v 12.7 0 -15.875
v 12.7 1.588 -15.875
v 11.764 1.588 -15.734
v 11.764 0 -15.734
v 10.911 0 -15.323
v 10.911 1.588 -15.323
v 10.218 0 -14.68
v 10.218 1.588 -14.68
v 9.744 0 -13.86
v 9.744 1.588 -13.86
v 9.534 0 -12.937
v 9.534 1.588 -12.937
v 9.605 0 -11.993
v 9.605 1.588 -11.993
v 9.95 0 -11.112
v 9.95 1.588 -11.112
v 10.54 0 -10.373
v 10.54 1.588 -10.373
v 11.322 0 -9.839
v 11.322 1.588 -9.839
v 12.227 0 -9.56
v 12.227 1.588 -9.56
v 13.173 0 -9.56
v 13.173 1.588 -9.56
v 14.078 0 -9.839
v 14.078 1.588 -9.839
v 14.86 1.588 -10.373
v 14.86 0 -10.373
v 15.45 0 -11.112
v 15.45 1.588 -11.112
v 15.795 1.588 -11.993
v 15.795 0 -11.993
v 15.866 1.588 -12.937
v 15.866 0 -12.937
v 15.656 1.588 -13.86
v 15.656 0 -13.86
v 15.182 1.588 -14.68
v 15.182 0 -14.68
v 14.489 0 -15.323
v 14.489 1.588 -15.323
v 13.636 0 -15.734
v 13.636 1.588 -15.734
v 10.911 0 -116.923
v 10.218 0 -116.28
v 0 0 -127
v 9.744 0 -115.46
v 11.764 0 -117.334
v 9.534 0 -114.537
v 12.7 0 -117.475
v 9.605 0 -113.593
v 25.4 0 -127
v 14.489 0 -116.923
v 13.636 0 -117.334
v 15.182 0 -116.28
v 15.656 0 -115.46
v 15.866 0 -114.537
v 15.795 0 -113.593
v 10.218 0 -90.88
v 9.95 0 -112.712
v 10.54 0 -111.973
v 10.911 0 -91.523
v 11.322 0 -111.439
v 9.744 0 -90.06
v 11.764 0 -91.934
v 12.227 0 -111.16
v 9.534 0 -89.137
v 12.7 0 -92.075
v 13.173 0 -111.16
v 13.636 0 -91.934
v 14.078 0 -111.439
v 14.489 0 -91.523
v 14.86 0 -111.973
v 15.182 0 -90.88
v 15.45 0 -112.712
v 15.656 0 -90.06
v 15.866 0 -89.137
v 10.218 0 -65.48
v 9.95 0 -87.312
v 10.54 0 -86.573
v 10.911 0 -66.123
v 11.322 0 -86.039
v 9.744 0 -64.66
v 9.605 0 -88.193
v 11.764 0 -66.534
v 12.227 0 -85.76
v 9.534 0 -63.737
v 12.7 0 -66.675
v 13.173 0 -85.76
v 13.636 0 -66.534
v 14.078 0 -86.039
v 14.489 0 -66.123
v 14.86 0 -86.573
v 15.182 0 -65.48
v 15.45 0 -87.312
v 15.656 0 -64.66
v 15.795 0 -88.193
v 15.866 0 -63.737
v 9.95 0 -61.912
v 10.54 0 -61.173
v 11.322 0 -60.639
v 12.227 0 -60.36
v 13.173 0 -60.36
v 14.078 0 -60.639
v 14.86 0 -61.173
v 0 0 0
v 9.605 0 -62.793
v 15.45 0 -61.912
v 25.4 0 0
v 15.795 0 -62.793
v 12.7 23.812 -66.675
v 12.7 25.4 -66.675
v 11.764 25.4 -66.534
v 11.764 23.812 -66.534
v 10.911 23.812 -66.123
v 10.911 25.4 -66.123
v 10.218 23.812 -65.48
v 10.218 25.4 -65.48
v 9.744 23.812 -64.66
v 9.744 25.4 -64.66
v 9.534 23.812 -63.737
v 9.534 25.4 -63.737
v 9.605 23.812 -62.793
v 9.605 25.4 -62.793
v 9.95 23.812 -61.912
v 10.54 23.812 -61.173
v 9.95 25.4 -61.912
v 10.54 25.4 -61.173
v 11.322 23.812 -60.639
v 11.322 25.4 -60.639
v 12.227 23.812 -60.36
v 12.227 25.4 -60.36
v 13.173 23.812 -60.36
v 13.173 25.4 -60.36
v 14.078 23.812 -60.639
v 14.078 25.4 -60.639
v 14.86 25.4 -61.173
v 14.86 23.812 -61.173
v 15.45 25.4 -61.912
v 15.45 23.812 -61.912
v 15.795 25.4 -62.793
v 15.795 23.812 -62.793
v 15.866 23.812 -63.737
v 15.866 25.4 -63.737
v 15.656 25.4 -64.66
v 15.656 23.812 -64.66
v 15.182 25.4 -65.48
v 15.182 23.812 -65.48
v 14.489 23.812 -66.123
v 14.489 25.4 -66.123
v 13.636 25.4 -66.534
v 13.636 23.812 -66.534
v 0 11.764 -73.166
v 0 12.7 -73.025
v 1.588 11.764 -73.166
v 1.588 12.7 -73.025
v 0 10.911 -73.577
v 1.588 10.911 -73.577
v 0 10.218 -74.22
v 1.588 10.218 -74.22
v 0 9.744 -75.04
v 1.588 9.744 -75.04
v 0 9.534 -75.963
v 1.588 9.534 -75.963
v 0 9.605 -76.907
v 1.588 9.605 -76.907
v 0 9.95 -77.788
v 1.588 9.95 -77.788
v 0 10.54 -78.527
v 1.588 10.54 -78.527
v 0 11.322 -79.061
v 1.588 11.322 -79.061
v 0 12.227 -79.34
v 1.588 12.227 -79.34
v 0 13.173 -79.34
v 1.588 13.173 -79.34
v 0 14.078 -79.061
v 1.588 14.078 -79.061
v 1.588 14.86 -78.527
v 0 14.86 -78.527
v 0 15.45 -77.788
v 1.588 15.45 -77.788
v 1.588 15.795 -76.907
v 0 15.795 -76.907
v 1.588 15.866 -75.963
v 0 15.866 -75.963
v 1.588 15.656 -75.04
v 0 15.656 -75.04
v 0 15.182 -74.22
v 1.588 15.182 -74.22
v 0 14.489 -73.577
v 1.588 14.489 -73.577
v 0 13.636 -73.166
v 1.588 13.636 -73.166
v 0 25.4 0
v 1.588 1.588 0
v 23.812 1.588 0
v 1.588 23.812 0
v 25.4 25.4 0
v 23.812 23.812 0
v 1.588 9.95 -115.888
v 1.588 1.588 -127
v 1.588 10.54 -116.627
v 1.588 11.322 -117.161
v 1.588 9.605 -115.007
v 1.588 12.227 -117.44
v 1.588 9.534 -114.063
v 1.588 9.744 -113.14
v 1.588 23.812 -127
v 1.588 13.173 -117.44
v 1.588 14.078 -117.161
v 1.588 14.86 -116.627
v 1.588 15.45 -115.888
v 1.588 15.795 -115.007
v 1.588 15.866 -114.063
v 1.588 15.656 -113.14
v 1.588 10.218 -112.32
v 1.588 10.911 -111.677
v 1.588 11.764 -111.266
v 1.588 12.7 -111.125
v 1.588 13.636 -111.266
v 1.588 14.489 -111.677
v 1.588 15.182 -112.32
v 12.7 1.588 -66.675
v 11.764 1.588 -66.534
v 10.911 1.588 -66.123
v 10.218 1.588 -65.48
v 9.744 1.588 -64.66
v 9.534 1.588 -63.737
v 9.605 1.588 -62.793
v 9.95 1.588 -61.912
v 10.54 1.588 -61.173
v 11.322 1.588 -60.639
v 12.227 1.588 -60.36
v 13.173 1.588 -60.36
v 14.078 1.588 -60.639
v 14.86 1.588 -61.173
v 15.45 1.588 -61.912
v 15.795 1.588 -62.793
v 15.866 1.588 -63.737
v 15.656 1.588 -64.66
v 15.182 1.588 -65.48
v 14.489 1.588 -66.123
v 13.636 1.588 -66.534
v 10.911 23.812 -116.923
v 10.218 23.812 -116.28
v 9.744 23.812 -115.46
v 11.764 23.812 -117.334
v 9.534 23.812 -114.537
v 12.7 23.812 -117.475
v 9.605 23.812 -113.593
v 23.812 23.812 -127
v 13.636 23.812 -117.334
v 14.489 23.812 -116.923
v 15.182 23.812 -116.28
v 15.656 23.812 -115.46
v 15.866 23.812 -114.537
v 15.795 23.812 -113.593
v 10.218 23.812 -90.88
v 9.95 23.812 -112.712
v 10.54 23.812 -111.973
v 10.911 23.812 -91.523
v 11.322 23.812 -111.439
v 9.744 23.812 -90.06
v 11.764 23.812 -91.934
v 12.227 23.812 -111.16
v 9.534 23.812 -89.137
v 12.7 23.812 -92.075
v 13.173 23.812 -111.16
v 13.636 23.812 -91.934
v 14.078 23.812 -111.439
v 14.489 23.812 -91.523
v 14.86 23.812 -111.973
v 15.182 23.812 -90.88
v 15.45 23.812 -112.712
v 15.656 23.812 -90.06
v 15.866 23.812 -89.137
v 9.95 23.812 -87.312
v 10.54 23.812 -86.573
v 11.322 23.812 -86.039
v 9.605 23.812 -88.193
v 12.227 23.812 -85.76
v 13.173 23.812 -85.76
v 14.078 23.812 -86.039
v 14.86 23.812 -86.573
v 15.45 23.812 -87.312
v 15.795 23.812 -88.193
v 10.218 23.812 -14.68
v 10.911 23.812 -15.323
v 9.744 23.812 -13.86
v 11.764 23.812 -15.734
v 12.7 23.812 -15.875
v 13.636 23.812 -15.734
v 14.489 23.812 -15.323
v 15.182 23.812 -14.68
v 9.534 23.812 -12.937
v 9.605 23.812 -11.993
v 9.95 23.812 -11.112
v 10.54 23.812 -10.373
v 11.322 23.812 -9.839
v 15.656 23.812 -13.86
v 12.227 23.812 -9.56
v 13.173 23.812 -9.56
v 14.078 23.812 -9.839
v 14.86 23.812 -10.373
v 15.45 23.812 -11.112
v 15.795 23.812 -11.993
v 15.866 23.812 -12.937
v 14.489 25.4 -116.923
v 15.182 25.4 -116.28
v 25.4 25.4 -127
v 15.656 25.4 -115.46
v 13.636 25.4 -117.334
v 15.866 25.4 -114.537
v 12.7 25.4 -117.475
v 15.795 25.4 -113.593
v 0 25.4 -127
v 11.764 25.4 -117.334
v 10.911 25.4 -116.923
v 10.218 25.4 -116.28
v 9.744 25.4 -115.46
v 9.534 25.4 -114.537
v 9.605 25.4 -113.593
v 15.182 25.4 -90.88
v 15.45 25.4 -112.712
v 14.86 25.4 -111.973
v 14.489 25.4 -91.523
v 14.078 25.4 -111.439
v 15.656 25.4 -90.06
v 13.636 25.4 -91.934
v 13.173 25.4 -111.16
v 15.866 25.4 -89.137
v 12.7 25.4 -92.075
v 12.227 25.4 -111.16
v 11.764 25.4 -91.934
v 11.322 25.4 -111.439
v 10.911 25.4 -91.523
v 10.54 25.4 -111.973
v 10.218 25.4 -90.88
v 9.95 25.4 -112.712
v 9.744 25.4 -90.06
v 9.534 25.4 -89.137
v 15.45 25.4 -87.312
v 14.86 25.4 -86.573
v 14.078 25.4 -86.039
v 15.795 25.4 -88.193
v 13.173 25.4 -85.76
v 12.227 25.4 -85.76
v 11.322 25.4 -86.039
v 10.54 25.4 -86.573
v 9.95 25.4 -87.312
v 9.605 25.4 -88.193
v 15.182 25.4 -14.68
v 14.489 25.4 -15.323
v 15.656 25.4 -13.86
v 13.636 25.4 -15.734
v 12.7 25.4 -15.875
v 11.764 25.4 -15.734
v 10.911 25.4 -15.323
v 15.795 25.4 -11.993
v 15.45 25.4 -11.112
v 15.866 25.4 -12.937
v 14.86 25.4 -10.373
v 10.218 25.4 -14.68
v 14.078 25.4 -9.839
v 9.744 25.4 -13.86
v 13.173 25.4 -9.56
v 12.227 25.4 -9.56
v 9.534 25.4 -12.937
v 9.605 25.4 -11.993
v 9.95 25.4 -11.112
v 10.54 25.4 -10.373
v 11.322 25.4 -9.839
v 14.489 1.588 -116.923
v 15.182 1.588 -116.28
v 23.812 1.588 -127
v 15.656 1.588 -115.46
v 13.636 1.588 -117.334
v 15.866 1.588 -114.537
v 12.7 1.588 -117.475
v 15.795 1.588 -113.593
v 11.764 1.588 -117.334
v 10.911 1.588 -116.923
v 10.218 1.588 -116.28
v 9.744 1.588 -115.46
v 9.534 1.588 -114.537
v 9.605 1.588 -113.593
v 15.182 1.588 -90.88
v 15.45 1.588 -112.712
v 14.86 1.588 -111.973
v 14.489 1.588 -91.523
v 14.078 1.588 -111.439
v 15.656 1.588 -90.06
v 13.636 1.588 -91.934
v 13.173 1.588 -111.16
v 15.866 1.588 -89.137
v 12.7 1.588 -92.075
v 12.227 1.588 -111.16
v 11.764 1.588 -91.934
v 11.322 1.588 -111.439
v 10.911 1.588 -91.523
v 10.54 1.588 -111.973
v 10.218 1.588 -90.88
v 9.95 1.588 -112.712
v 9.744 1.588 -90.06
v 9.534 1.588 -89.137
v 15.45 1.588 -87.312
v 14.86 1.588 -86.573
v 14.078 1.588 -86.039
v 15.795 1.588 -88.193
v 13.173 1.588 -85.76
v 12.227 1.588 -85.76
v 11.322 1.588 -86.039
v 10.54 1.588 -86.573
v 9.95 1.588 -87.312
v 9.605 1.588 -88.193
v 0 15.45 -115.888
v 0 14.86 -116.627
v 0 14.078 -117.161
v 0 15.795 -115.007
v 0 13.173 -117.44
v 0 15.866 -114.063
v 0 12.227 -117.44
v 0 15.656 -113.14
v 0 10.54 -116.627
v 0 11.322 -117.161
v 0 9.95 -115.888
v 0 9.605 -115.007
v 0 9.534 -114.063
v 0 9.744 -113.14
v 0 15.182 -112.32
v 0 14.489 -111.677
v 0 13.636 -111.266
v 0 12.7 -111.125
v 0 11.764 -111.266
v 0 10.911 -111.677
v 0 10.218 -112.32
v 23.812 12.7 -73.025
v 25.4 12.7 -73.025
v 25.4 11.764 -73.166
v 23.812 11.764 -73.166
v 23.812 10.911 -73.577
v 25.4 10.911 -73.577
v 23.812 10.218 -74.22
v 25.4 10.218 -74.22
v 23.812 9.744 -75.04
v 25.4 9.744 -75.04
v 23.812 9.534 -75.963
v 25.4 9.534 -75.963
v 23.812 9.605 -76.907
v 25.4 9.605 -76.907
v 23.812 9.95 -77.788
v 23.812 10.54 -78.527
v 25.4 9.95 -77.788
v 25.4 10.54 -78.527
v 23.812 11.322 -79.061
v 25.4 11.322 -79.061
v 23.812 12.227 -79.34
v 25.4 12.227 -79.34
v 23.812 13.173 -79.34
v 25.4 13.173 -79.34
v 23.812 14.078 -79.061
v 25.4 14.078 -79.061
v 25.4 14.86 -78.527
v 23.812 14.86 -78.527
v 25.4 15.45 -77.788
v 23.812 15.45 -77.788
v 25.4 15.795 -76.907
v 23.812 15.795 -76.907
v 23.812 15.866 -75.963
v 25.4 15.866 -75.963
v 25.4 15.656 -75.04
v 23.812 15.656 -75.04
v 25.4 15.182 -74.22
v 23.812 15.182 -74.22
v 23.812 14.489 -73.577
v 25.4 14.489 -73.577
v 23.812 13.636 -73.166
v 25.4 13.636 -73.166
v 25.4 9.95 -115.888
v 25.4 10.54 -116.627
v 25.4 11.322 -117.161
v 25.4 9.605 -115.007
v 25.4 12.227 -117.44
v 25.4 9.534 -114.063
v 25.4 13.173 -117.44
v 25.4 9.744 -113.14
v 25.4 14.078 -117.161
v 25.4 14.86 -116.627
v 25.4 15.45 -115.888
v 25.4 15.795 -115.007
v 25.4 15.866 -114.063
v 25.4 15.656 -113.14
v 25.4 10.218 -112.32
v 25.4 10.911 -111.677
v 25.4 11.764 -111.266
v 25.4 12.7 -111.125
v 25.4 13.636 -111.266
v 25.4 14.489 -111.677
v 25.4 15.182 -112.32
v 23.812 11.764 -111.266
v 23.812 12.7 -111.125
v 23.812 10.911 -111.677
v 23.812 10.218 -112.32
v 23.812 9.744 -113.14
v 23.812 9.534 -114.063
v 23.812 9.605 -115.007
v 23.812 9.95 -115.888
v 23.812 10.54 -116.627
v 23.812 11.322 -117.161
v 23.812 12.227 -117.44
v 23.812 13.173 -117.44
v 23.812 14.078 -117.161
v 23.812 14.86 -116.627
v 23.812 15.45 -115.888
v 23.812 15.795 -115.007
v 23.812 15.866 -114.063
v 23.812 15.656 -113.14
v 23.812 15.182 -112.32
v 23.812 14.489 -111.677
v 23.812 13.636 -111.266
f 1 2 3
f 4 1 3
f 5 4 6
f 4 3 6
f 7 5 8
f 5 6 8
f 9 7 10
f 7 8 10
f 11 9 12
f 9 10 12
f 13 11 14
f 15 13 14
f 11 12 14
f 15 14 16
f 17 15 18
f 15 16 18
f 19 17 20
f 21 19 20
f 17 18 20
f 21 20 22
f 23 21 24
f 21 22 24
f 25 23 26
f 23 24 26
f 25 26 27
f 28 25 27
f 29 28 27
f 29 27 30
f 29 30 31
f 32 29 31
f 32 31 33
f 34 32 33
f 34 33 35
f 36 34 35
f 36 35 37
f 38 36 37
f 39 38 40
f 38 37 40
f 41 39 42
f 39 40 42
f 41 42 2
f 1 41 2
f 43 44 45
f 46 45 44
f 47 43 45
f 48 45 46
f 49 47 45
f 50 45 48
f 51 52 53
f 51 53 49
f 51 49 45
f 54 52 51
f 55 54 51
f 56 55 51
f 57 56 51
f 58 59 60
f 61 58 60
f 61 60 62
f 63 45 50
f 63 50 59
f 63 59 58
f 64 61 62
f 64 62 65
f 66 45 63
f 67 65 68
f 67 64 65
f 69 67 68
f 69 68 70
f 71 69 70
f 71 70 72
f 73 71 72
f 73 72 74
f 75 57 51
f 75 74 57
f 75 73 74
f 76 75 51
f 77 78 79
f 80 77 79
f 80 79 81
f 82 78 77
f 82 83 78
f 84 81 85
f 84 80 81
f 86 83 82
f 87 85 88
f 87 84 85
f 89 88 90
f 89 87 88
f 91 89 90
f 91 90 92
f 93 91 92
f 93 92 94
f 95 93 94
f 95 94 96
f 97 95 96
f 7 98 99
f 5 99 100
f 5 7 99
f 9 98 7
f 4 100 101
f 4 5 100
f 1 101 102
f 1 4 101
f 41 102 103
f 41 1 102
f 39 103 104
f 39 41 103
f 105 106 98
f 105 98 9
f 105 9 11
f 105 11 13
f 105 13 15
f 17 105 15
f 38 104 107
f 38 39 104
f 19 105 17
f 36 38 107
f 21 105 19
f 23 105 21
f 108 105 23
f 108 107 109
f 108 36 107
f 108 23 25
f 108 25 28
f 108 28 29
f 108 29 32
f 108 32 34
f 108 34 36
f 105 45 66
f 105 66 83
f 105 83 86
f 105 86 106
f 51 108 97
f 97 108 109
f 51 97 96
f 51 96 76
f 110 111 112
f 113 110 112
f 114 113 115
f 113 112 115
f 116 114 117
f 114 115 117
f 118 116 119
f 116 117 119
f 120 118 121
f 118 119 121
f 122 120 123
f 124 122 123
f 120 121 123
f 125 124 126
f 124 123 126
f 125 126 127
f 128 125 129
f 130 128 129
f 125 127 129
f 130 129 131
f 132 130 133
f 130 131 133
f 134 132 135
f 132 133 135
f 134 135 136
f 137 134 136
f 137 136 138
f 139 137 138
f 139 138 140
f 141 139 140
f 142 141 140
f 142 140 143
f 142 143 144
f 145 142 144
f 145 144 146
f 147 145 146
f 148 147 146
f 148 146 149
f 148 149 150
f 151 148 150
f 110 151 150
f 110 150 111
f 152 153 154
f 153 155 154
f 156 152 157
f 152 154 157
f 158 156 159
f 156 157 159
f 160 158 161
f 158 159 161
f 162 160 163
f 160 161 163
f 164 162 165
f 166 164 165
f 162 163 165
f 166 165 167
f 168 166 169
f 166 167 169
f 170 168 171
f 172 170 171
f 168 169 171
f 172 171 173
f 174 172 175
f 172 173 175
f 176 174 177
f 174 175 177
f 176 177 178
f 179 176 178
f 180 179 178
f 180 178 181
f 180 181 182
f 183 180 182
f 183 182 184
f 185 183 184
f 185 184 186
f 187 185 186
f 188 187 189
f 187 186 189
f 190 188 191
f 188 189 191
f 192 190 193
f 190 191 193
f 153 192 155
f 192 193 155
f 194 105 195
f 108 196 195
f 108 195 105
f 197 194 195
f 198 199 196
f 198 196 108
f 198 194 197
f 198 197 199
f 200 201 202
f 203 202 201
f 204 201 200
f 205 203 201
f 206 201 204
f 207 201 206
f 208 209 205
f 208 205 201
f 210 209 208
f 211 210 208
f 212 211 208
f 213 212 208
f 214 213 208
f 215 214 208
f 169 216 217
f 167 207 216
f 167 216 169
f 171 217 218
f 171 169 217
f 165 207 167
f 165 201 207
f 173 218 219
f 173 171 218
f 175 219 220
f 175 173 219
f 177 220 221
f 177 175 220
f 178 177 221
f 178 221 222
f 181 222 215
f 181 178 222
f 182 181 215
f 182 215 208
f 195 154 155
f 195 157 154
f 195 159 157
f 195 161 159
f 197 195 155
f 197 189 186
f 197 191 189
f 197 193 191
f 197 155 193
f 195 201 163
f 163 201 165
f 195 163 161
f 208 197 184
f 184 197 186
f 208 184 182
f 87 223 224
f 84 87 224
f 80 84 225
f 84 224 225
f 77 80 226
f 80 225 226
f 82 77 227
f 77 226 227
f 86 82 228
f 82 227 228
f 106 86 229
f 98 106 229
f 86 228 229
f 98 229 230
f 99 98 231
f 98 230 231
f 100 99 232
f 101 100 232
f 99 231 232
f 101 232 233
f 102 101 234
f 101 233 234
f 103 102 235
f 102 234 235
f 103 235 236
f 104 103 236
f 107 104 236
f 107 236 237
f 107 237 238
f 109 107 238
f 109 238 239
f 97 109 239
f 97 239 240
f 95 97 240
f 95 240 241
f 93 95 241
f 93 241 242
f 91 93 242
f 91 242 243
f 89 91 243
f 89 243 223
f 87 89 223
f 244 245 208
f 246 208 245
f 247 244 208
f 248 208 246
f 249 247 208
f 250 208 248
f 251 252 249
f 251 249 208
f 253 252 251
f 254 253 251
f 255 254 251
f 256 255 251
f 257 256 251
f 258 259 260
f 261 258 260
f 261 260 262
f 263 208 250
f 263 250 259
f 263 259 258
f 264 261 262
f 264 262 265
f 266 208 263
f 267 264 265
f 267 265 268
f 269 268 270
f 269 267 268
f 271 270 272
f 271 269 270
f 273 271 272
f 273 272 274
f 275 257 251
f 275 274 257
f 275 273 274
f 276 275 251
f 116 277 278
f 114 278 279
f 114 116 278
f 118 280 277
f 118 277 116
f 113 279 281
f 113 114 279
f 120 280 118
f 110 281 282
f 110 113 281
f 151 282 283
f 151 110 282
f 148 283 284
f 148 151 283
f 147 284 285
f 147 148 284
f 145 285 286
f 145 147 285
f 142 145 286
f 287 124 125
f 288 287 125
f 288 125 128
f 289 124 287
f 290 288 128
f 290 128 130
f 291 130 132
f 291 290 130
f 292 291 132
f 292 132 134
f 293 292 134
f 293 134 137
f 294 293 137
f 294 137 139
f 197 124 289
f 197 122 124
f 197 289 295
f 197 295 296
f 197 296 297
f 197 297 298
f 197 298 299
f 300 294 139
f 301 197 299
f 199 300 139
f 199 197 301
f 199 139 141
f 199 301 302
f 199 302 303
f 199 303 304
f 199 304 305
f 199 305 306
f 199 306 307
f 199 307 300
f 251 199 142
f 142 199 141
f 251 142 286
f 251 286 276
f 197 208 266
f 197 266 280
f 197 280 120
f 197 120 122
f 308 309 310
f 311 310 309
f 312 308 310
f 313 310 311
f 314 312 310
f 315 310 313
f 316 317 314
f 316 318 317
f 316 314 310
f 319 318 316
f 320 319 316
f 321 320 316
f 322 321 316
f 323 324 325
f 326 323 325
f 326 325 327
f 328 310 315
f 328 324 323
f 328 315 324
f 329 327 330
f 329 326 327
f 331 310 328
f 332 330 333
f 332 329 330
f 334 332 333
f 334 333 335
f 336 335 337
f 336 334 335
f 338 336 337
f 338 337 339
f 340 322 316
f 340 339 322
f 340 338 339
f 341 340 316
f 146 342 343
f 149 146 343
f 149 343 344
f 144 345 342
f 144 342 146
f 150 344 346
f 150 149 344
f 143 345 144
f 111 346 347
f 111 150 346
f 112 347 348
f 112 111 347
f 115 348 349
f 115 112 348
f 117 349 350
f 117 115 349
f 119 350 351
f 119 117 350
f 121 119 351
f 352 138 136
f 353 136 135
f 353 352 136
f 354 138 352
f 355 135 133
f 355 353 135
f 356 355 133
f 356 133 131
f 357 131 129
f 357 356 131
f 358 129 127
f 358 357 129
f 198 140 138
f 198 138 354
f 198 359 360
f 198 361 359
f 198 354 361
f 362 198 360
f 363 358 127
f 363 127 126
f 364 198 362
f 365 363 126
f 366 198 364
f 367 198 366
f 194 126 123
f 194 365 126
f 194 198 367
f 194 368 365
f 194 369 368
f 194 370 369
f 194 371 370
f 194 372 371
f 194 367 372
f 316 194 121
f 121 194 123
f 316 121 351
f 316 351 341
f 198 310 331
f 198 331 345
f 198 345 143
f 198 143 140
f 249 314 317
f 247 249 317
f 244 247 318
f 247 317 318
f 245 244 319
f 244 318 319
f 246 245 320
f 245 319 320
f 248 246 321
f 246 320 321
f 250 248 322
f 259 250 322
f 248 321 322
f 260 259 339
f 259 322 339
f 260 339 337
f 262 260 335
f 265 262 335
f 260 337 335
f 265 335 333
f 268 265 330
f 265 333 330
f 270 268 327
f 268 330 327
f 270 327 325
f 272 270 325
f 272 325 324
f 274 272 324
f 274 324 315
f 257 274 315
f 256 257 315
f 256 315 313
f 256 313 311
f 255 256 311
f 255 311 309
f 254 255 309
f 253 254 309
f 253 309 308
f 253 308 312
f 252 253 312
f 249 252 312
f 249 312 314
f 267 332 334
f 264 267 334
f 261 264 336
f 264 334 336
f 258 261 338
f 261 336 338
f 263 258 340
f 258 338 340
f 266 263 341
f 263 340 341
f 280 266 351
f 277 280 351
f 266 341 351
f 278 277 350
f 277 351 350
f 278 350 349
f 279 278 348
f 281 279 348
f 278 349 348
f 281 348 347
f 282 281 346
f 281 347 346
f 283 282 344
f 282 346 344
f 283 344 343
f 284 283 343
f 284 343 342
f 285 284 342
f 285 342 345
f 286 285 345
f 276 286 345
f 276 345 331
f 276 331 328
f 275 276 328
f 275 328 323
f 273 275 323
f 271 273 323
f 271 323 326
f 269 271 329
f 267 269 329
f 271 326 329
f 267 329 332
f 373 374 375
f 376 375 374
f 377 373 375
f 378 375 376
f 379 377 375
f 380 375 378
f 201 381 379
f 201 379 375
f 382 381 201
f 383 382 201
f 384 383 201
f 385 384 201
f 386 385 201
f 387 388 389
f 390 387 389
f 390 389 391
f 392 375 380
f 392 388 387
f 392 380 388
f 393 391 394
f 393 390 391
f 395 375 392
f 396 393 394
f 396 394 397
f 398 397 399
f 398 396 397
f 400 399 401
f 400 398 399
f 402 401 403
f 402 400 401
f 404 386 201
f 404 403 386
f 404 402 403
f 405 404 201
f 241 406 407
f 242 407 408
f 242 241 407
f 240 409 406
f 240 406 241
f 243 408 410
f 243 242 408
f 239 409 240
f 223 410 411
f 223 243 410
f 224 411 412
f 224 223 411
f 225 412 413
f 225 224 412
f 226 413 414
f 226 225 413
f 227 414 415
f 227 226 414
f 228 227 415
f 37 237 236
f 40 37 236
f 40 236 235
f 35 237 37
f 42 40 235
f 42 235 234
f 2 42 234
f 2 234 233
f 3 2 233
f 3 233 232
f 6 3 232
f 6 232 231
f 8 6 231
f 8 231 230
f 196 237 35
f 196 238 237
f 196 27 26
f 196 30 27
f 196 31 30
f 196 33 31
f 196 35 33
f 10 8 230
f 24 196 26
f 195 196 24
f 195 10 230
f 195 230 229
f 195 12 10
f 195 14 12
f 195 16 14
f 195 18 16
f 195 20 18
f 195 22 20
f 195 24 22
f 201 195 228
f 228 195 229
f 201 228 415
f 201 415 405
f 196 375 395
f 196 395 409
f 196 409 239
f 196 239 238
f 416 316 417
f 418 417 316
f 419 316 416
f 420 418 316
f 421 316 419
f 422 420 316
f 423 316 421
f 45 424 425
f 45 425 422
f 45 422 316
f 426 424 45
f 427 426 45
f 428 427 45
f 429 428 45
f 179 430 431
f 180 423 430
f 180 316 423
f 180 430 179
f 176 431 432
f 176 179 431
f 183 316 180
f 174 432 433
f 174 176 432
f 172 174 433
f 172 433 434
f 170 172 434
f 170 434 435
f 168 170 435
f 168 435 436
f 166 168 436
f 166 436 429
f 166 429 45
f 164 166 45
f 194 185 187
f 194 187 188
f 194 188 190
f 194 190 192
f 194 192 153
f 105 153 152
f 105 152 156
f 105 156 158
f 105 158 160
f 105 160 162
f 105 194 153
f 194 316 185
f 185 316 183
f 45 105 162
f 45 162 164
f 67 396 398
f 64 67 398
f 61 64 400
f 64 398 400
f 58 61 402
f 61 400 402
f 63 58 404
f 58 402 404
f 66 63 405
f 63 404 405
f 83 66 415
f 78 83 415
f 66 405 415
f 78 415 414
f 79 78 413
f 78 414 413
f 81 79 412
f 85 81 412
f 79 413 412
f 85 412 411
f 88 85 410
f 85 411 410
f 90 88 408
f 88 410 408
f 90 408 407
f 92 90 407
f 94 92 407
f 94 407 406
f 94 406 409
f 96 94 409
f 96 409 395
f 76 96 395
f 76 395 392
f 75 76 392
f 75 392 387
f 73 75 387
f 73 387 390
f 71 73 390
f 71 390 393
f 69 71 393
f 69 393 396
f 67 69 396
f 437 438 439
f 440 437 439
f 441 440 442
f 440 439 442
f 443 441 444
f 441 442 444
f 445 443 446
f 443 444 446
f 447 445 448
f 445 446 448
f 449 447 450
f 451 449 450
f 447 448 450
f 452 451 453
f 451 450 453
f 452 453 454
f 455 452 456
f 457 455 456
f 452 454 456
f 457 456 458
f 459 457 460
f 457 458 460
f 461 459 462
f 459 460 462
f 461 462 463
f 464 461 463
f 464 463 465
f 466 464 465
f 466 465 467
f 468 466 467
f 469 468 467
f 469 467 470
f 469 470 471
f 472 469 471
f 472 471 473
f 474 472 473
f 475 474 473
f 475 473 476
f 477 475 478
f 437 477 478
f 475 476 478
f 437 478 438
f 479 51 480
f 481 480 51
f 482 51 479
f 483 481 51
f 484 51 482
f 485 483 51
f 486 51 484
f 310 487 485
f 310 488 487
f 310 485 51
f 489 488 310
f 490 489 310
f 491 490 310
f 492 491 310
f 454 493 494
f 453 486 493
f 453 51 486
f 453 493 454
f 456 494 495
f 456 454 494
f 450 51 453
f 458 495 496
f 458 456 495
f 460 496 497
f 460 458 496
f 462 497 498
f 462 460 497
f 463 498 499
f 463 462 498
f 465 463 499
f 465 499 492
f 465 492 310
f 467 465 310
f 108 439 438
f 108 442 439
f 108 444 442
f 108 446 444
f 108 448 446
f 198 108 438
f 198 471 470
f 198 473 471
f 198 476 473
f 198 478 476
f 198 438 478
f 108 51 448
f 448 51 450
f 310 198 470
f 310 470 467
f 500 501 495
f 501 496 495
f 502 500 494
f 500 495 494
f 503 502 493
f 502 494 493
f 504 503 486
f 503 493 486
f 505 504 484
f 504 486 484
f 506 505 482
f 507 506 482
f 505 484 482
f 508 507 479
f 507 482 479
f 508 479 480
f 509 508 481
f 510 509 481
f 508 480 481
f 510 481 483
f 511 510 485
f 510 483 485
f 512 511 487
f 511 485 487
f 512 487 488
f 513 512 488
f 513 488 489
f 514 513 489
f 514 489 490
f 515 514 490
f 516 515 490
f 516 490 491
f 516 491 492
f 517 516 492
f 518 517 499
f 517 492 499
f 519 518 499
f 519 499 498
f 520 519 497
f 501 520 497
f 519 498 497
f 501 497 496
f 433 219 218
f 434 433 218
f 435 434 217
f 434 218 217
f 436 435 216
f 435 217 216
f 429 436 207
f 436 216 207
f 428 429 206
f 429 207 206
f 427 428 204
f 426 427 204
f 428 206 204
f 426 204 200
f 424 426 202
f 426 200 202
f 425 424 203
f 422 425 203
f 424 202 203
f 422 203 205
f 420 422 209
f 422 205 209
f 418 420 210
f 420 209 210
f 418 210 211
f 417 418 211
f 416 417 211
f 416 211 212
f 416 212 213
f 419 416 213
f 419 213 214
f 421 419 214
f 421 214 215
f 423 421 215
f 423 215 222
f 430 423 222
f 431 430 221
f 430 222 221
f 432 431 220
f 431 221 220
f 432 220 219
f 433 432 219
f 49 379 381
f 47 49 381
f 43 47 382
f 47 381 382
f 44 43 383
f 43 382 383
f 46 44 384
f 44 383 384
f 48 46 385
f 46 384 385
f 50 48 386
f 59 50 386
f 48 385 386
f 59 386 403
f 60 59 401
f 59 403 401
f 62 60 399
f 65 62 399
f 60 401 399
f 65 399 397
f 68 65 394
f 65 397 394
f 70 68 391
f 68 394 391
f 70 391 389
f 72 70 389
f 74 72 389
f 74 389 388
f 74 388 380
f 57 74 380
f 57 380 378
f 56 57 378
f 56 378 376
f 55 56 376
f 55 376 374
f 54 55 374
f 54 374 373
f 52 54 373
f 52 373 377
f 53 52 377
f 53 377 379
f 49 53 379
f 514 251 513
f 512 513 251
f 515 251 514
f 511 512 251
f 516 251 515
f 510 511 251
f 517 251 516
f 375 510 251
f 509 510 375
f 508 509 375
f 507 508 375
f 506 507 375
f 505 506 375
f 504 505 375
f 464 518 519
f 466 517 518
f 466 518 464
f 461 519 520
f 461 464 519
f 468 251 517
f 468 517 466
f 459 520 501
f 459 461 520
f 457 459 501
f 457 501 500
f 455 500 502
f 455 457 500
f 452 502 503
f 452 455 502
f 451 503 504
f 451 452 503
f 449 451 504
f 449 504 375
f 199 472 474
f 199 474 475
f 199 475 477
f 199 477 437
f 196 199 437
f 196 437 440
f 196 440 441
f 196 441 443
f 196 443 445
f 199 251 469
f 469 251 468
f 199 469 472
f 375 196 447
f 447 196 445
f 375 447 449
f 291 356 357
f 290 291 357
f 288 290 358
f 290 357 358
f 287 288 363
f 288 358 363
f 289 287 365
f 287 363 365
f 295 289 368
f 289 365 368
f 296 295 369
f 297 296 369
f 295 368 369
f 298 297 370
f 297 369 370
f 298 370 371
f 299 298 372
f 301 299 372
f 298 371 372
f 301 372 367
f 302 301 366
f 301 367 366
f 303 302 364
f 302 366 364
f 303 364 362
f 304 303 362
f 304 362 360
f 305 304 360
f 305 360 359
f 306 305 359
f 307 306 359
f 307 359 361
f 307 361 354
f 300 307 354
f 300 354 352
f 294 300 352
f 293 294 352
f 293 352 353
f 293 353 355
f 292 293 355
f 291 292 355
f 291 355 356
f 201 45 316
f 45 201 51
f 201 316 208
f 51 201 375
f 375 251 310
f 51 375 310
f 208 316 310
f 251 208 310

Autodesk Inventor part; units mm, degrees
ref_plane "YZ Plane" through (0, 0, 0) normal (1, 0, 0) x (0, 1, 0)
ref_plane "XZ Plane" through (0, 0, 0) normal (0, 1, 0) x (-1, 0, 0)
ref_plane "XY Plane" through (0, 0, 0) normal (0, 0, 1) x (1, 0, 0)
sketch "Sketch1" plane through (0, 0, 0) normal (0, 0, 1) x (1, 0, 0)
  line L0 (0, 0) -> (25.4, 0)
  line L1 (25.4, 0) -> (25.4, 25.4)
  line L2 (25.4, 25.4) -> (0, 25.4)
  line L3 (0, 25.4) -> (0, 0)
  line L4 (1.5875, 23.8125) -> (23.8125, 23.8125)
  line L5 (23.8125, 23.8125) -> (23.8125, 1.5875)
  line L6 (23.8125, 1.5875) -> (1.5875, 1.5875)
  line L7 (1.5875, 1.5875) -> (1.5875, 23.8125)
  dimension "d0" = 25.4
  dimension "d1" = 25.4
  dimension "d2" = 1.5875
extrude "Extrusion1" add sketch "Sketch1" against normal blind 127
sketch "Sketch2" plane through (0, 0, 0) normal (0, -1, 0) x (1, 0, 0)
  line L0 (0, -127) -> (25.4, -127) projected
  line L1 (0, 0) -> (25.4, 0) projected
  point P0 (12.7, -12.7)
  point P1 (12.7, -114.3)
  point P2 (12.7, -88.9)
  point P3 (12.7, -63.5)
  point P4 (12.7, -127)
  dimension "d5" = 25.4
  dimension "d6" = 25.4
  dimension "d7" = 12.7
  dimension "d8" = 12.7
hole "Hole1" at (12.7, 0, -12.7) at (12.7, 0, -114.3) at (12.7, 0, -88.9) at (12.7, 0, -63.5) direction (0, 1, 0) diameter 6.35 depth 25.4 tip angle 118
sketch "Sketch3" plane through (0, 0, 0) normal (-1, 0, 0) x (0, 0, 1)
  line L0 (-127, 25.4) -> (-127, 0) projected
  point P0 (-114.3, 12.7)
  point P1 (-76.2, 12.7)
  dimension "d25" = 12.7
  dimension "d27" = 38.1
hole "Hole2" at (0, 12.7, -114.3) at (0, 12.7, -76.2) direction (1, 0, 0) diameter 6.35 depth 25.4 tip angle 118
properties part number "1tube_6"
